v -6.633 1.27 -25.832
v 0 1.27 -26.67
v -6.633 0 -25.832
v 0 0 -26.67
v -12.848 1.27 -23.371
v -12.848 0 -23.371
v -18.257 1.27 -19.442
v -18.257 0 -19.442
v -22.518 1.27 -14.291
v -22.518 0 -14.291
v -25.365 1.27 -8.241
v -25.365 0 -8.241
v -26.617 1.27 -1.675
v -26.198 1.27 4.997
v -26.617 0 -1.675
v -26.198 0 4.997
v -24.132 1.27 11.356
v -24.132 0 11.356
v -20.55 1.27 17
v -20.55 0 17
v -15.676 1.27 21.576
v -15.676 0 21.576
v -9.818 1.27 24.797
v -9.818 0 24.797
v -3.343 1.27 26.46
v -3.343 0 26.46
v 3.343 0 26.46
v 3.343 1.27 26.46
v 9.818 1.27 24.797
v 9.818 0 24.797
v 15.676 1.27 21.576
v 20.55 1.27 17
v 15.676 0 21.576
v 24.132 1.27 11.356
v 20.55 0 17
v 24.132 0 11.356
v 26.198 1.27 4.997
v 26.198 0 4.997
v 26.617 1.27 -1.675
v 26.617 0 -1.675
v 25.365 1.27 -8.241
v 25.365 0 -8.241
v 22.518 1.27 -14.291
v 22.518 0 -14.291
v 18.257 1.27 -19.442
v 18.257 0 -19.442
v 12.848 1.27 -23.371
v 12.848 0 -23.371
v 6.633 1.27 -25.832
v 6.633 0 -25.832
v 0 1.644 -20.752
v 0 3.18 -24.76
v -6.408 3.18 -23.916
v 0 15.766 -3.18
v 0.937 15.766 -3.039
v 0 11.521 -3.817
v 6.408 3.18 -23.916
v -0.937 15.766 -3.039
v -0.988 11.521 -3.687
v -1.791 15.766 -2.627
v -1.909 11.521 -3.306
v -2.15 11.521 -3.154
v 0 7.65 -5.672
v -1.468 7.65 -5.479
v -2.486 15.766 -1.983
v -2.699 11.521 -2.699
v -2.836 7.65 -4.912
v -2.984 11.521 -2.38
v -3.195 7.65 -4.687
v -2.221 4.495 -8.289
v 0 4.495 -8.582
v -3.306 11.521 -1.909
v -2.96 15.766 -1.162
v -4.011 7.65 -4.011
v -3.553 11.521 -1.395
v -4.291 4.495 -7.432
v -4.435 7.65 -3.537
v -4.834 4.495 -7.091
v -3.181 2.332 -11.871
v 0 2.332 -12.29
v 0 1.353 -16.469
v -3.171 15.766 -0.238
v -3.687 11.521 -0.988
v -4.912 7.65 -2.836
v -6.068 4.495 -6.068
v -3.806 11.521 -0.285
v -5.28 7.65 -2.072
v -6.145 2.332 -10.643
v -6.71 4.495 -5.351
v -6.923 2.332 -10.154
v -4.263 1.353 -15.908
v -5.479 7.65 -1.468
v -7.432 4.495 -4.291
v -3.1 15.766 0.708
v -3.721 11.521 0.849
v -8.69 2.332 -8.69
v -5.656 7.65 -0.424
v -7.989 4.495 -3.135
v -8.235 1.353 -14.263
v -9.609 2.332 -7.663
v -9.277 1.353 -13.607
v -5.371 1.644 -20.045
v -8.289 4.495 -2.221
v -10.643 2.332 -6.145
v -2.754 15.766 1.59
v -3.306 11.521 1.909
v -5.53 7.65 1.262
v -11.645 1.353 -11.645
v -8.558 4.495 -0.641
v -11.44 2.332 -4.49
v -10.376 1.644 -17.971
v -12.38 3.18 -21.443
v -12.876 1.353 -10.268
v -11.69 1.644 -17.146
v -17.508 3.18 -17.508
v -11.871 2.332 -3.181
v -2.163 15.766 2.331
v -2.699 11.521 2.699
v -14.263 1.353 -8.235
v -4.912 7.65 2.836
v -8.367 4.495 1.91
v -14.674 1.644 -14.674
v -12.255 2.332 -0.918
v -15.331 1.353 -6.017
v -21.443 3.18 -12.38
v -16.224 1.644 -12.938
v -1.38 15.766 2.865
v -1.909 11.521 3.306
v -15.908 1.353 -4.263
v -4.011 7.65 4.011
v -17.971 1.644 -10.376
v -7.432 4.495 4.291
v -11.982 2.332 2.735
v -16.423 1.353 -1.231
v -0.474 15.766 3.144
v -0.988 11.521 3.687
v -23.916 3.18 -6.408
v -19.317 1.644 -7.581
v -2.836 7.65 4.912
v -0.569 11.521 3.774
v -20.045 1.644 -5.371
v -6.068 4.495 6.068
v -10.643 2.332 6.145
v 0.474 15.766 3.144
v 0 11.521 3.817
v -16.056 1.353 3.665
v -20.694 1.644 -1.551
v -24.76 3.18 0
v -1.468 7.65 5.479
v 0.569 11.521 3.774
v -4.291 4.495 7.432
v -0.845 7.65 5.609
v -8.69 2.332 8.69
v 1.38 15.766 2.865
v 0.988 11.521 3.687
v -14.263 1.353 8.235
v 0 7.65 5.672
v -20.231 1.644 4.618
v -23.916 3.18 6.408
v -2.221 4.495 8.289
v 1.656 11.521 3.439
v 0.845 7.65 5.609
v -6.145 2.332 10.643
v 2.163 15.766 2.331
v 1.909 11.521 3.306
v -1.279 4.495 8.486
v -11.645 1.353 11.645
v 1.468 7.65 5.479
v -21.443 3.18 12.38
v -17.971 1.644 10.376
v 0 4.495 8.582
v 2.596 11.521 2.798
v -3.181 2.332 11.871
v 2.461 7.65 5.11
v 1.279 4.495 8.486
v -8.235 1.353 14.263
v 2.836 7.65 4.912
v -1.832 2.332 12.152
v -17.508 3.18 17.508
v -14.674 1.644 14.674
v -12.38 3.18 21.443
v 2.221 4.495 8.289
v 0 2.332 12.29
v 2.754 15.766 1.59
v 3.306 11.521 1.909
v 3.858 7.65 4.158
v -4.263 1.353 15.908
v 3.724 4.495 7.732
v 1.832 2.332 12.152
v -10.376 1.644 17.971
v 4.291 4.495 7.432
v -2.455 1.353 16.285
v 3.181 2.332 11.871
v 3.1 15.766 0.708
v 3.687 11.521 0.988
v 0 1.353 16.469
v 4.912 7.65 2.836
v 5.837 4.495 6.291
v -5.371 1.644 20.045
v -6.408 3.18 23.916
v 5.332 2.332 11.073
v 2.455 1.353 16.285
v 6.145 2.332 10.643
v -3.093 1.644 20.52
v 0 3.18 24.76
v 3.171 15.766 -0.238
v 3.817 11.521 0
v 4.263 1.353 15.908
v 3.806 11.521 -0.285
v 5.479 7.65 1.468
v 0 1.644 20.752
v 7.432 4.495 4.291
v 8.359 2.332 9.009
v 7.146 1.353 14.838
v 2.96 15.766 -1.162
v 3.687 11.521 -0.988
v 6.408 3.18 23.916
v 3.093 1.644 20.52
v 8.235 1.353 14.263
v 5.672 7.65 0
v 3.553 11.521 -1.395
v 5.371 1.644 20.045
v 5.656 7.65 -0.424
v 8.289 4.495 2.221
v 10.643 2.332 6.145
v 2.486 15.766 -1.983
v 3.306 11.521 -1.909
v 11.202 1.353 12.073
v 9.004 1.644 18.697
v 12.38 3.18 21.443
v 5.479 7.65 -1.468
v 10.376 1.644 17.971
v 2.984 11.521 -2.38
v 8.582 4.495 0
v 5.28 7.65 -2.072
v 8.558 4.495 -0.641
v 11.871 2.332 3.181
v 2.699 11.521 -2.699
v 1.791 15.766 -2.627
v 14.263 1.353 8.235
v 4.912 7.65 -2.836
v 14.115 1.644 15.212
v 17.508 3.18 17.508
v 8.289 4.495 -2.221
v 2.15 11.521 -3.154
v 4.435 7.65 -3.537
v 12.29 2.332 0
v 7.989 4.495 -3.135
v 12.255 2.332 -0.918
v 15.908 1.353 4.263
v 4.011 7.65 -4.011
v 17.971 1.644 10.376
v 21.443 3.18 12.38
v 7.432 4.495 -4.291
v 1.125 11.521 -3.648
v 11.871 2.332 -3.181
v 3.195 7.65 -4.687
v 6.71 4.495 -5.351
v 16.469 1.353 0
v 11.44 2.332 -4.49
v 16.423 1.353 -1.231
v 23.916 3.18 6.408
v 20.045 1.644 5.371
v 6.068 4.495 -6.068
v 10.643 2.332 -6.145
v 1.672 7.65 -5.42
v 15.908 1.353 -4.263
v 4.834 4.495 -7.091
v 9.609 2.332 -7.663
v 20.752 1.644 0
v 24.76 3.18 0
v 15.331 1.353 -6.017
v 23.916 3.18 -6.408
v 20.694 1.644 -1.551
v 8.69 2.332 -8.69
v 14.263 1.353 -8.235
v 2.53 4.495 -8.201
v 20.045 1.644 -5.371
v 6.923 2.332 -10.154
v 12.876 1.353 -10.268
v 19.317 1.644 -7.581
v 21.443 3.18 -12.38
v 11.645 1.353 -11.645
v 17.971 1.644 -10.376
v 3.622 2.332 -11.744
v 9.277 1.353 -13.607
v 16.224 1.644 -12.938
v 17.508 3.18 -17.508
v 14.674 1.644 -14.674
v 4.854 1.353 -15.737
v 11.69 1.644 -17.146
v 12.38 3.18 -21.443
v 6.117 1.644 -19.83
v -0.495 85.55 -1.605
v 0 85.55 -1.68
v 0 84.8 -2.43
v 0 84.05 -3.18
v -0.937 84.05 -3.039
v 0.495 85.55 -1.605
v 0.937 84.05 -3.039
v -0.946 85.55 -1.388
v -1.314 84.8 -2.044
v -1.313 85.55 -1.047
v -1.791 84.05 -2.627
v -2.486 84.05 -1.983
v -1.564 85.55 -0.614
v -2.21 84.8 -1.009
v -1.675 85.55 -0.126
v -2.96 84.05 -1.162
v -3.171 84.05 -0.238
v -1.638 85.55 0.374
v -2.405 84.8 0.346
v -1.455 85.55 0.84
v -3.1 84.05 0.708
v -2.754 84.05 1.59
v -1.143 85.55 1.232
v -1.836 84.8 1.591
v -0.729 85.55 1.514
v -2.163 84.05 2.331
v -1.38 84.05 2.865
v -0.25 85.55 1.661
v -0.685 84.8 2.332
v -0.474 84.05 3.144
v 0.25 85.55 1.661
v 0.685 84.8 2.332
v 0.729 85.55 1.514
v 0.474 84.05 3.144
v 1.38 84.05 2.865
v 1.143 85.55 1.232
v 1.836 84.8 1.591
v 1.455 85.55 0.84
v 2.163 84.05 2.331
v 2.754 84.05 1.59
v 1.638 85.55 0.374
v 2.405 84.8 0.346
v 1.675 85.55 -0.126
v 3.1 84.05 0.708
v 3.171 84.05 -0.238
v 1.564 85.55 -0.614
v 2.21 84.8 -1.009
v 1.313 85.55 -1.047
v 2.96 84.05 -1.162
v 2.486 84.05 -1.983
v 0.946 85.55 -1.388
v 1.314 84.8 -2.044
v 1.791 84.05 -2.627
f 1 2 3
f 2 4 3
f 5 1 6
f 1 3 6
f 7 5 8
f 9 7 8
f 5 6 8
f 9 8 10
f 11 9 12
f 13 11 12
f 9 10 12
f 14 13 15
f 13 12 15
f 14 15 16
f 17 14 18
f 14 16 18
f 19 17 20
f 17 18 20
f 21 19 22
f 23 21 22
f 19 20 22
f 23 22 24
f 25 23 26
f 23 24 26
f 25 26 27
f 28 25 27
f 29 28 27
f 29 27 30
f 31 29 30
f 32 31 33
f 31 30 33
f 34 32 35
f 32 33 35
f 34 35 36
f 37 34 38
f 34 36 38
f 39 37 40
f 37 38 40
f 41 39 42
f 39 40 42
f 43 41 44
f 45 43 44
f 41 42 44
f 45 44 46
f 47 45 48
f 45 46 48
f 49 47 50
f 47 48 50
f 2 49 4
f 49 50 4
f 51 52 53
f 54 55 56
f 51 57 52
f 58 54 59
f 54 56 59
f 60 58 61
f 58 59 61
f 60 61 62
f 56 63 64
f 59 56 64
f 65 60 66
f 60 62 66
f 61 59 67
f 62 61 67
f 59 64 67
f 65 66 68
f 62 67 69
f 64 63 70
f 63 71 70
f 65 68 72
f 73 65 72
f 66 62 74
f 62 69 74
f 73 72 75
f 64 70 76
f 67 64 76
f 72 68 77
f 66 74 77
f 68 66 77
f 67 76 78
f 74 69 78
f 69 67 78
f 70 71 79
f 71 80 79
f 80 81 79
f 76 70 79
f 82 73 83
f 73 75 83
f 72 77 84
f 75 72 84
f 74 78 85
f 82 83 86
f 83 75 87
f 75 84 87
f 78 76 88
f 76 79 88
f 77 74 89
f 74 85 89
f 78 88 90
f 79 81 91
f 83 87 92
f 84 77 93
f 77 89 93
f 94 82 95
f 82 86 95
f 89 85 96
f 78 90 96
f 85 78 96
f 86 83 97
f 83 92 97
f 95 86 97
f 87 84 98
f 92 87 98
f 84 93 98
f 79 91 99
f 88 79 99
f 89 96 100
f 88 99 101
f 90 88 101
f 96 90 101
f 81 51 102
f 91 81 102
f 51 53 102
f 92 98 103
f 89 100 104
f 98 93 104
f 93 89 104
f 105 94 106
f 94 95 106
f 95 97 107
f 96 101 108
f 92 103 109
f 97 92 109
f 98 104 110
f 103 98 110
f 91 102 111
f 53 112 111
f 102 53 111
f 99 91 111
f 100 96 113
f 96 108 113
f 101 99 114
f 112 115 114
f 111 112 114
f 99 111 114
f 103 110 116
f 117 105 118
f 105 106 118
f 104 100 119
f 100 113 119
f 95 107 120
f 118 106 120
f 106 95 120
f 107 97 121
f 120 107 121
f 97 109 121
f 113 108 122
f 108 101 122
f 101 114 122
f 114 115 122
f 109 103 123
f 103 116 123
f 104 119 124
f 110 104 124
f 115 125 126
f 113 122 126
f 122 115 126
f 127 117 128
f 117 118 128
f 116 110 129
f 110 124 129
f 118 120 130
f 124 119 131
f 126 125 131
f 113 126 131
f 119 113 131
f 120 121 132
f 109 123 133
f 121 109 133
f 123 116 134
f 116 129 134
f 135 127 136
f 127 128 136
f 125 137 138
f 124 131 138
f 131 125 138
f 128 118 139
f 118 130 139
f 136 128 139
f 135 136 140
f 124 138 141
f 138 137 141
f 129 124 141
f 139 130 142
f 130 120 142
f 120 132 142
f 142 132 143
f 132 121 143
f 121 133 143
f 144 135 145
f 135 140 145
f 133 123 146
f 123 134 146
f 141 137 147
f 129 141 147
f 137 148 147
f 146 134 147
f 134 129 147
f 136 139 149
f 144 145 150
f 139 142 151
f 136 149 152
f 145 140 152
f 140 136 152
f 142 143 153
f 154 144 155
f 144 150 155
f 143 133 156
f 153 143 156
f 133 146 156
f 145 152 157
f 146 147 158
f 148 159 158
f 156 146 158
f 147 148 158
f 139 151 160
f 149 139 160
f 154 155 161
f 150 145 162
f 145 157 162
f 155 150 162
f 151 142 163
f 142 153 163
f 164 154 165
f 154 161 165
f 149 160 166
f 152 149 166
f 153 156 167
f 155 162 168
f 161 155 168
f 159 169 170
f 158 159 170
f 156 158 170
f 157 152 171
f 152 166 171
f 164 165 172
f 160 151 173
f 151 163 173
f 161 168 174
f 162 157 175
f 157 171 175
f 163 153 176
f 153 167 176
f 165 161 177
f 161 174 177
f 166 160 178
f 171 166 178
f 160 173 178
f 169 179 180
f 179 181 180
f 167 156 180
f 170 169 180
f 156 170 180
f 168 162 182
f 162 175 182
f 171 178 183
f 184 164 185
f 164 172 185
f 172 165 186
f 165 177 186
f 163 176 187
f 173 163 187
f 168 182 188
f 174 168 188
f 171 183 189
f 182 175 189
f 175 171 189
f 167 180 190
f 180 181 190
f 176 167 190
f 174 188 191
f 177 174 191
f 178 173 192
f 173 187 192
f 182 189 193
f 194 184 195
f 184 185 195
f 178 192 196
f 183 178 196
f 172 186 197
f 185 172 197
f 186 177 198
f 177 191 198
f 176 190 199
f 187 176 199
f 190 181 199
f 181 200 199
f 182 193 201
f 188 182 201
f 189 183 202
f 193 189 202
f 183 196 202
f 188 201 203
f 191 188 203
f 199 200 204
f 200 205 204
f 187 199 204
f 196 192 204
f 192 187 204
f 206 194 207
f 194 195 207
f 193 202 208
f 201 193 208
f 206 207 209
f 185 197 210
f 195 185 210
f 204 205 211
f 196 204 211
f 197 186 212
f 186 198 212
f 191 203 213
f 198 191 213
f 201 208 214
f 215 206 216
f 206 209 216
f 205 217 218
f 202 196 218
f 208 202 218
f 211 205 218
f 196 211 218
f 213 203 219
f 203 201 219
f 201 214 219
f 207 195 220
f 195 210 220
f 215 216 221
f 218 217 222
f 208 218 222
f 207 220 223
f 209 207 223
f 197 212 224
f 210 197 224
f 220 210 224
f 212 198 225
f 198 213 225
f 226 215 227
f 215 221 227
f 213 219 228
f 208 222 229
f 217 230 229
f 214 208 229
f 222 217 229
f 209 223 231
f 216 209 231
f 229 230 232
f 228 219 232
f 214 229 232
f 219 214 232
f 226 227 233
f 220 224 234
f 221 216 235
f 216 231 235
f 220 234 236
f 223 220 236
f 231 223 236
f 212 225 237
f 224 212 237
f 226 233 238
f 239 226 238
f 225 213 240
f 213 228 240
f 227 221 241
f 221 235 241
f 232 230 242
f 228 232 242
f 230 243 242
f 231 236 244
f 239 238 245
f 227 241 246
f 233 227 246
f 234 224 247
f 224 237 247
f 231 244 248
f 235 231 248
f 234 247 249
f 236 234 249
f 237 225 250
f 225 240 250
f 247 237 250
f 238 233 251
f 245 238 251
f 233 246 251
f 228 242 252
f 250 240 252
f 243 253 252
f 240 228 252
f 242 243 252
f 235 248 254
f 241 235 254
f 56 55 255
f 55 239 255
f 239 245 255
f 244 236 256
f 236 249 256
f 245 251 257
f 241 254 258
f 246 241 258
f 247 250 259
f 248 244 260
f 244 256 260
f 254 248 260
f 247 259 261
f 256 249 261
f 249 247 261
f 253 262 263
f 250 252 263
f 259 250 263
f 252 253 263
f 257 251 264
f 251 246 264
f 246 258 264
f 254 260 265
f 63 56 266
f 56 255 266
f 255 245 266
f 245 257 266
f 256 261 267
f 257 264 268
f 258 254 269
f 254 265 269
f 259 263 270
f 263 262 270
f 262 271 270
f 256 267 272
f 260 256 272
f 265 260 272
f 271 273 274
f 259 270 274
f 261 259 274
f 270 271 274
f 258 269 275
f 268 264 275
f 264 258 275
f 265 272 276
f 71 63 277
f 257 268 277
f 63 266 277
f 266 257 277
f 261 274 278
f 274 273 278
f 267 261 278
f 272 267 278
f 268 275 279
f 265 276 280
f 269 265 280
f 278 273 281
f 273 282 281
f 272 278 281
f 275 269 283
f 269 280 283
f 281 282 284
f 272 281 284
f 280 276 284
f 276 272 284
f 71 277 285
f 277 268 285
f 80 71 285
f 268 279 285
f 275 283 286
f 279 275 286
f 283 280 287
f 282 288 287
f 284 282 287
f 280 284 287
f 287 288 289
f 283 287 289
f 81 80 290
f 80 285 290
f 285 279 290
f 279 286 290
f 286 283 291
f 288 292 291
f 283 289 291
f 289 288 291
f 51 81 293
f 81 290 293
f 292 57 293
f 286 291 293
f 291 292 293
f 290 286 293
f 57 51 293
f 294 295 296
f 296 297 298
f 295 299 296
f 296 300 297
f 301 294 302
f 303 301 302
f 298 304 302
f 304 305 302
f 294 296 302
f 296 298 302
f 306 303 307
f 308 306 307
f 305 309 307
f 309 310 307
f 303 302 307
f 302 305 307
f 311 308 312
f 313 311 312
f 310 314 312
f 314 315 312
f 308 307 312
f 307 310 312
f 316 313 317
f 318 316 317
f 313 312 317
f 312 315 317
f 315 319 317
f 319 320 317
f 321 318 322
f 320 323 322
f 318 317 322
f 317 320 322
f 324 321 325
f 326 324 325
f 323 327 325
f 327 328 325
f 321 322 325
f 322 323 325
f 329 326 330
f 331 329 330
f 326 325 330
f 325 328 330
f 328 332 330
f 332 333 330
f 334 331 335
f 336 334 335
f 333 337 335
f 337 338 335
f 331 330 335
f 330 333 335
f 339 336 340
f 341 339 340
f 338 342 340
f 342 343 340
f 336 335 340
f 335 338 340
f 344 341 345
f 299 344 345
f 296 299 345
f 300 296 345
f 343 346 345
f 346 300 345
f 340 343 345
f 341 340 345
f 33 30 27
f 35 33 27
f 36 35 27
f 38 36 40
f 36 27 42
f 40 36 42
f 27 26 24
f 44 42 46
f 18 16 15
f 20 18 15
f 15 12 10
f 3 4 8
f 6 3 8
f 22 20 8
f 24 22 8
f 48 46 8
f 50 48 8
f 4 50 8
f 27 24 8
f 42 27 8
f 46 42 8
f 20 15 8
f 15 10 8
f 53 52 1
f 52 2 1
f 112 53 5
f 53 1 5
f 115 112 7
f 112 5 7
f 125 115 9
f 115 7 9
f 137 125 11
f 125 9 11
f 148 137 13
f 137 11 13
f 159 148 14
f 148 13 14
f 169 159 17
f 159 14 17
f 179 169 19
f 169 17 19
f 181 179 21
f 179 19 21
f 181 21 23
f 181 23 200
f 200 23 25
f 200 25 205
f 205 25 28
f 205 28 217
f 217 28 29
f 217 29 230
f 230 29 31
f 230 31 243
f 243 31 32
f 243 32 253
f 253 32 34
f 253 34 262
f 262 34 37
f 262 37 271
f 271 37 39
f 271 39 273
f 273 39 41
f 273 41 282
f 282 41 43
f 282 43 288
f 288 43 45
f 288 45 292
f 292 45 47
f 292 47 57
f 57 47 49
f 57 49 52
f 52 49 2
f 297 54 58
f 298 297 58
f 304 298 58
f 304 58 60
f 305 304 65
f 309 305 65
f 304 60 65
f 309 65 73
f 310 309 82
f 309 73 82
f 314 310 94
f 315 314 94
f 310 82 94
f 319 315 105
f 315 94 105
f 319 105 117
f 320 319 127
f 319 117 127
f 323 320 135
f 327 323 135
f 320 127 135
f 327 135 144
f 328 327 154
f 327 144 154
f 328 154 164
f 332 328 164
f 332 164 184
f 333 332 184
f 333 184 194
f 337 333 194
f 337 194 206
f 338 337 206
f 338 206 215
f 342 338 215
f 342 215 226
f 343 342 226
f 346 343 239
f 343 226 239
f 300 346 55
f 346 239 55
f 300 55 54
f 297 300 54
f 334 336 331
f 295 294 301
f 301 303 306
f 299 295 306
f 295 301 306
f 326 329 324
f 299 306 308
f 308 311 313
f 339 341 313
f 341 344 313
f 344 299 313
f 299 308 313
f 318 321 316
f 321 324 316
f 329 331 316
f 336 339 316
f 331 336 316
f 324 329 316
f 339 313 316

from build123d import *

# Parameters (mm, degrees)
CHAMFER1_SIZE = 1.5


with BuildPart() as part:
    # Sketch1 → Revolve1 (revolve)
    with BuildSketch(Plane.XY, mode=Mode.PRIVATE) as revolve1_sk:
        with BuildLine():
            Line((0, 0), (0, 85.55))
            Line((0, 85.55), (3.18, 85.55))
            Line((3.18, 85.55), (3.18, 15.766075305))
            ThreePointArc((3.18, 15.766075305), (10.355139161, 3.27502159), (24.76, 3.18))
            Line((24.76, 3.18), (26.67, 1.27))
            Line((26.67, 1.27), (26.67, 0))
            Line((26.67, 0), (0, 0))
        make_face()
    revolve(revolve1_sk.sketch.rotate(Axis((0, 0, 0), (0, 1, 0)), 90), axis=Axis((0, 0, 0), (0, 1, 0)))

    # Chamfer1
    chamfer1_edges = [part.edges().sort_by_distance(p)[0] for p in [
        (0, 85.55, 3.18),
    ]]
    chamfer(chamfer1_edges, length=CHAMFER1_SIZE)


solid = part.part
